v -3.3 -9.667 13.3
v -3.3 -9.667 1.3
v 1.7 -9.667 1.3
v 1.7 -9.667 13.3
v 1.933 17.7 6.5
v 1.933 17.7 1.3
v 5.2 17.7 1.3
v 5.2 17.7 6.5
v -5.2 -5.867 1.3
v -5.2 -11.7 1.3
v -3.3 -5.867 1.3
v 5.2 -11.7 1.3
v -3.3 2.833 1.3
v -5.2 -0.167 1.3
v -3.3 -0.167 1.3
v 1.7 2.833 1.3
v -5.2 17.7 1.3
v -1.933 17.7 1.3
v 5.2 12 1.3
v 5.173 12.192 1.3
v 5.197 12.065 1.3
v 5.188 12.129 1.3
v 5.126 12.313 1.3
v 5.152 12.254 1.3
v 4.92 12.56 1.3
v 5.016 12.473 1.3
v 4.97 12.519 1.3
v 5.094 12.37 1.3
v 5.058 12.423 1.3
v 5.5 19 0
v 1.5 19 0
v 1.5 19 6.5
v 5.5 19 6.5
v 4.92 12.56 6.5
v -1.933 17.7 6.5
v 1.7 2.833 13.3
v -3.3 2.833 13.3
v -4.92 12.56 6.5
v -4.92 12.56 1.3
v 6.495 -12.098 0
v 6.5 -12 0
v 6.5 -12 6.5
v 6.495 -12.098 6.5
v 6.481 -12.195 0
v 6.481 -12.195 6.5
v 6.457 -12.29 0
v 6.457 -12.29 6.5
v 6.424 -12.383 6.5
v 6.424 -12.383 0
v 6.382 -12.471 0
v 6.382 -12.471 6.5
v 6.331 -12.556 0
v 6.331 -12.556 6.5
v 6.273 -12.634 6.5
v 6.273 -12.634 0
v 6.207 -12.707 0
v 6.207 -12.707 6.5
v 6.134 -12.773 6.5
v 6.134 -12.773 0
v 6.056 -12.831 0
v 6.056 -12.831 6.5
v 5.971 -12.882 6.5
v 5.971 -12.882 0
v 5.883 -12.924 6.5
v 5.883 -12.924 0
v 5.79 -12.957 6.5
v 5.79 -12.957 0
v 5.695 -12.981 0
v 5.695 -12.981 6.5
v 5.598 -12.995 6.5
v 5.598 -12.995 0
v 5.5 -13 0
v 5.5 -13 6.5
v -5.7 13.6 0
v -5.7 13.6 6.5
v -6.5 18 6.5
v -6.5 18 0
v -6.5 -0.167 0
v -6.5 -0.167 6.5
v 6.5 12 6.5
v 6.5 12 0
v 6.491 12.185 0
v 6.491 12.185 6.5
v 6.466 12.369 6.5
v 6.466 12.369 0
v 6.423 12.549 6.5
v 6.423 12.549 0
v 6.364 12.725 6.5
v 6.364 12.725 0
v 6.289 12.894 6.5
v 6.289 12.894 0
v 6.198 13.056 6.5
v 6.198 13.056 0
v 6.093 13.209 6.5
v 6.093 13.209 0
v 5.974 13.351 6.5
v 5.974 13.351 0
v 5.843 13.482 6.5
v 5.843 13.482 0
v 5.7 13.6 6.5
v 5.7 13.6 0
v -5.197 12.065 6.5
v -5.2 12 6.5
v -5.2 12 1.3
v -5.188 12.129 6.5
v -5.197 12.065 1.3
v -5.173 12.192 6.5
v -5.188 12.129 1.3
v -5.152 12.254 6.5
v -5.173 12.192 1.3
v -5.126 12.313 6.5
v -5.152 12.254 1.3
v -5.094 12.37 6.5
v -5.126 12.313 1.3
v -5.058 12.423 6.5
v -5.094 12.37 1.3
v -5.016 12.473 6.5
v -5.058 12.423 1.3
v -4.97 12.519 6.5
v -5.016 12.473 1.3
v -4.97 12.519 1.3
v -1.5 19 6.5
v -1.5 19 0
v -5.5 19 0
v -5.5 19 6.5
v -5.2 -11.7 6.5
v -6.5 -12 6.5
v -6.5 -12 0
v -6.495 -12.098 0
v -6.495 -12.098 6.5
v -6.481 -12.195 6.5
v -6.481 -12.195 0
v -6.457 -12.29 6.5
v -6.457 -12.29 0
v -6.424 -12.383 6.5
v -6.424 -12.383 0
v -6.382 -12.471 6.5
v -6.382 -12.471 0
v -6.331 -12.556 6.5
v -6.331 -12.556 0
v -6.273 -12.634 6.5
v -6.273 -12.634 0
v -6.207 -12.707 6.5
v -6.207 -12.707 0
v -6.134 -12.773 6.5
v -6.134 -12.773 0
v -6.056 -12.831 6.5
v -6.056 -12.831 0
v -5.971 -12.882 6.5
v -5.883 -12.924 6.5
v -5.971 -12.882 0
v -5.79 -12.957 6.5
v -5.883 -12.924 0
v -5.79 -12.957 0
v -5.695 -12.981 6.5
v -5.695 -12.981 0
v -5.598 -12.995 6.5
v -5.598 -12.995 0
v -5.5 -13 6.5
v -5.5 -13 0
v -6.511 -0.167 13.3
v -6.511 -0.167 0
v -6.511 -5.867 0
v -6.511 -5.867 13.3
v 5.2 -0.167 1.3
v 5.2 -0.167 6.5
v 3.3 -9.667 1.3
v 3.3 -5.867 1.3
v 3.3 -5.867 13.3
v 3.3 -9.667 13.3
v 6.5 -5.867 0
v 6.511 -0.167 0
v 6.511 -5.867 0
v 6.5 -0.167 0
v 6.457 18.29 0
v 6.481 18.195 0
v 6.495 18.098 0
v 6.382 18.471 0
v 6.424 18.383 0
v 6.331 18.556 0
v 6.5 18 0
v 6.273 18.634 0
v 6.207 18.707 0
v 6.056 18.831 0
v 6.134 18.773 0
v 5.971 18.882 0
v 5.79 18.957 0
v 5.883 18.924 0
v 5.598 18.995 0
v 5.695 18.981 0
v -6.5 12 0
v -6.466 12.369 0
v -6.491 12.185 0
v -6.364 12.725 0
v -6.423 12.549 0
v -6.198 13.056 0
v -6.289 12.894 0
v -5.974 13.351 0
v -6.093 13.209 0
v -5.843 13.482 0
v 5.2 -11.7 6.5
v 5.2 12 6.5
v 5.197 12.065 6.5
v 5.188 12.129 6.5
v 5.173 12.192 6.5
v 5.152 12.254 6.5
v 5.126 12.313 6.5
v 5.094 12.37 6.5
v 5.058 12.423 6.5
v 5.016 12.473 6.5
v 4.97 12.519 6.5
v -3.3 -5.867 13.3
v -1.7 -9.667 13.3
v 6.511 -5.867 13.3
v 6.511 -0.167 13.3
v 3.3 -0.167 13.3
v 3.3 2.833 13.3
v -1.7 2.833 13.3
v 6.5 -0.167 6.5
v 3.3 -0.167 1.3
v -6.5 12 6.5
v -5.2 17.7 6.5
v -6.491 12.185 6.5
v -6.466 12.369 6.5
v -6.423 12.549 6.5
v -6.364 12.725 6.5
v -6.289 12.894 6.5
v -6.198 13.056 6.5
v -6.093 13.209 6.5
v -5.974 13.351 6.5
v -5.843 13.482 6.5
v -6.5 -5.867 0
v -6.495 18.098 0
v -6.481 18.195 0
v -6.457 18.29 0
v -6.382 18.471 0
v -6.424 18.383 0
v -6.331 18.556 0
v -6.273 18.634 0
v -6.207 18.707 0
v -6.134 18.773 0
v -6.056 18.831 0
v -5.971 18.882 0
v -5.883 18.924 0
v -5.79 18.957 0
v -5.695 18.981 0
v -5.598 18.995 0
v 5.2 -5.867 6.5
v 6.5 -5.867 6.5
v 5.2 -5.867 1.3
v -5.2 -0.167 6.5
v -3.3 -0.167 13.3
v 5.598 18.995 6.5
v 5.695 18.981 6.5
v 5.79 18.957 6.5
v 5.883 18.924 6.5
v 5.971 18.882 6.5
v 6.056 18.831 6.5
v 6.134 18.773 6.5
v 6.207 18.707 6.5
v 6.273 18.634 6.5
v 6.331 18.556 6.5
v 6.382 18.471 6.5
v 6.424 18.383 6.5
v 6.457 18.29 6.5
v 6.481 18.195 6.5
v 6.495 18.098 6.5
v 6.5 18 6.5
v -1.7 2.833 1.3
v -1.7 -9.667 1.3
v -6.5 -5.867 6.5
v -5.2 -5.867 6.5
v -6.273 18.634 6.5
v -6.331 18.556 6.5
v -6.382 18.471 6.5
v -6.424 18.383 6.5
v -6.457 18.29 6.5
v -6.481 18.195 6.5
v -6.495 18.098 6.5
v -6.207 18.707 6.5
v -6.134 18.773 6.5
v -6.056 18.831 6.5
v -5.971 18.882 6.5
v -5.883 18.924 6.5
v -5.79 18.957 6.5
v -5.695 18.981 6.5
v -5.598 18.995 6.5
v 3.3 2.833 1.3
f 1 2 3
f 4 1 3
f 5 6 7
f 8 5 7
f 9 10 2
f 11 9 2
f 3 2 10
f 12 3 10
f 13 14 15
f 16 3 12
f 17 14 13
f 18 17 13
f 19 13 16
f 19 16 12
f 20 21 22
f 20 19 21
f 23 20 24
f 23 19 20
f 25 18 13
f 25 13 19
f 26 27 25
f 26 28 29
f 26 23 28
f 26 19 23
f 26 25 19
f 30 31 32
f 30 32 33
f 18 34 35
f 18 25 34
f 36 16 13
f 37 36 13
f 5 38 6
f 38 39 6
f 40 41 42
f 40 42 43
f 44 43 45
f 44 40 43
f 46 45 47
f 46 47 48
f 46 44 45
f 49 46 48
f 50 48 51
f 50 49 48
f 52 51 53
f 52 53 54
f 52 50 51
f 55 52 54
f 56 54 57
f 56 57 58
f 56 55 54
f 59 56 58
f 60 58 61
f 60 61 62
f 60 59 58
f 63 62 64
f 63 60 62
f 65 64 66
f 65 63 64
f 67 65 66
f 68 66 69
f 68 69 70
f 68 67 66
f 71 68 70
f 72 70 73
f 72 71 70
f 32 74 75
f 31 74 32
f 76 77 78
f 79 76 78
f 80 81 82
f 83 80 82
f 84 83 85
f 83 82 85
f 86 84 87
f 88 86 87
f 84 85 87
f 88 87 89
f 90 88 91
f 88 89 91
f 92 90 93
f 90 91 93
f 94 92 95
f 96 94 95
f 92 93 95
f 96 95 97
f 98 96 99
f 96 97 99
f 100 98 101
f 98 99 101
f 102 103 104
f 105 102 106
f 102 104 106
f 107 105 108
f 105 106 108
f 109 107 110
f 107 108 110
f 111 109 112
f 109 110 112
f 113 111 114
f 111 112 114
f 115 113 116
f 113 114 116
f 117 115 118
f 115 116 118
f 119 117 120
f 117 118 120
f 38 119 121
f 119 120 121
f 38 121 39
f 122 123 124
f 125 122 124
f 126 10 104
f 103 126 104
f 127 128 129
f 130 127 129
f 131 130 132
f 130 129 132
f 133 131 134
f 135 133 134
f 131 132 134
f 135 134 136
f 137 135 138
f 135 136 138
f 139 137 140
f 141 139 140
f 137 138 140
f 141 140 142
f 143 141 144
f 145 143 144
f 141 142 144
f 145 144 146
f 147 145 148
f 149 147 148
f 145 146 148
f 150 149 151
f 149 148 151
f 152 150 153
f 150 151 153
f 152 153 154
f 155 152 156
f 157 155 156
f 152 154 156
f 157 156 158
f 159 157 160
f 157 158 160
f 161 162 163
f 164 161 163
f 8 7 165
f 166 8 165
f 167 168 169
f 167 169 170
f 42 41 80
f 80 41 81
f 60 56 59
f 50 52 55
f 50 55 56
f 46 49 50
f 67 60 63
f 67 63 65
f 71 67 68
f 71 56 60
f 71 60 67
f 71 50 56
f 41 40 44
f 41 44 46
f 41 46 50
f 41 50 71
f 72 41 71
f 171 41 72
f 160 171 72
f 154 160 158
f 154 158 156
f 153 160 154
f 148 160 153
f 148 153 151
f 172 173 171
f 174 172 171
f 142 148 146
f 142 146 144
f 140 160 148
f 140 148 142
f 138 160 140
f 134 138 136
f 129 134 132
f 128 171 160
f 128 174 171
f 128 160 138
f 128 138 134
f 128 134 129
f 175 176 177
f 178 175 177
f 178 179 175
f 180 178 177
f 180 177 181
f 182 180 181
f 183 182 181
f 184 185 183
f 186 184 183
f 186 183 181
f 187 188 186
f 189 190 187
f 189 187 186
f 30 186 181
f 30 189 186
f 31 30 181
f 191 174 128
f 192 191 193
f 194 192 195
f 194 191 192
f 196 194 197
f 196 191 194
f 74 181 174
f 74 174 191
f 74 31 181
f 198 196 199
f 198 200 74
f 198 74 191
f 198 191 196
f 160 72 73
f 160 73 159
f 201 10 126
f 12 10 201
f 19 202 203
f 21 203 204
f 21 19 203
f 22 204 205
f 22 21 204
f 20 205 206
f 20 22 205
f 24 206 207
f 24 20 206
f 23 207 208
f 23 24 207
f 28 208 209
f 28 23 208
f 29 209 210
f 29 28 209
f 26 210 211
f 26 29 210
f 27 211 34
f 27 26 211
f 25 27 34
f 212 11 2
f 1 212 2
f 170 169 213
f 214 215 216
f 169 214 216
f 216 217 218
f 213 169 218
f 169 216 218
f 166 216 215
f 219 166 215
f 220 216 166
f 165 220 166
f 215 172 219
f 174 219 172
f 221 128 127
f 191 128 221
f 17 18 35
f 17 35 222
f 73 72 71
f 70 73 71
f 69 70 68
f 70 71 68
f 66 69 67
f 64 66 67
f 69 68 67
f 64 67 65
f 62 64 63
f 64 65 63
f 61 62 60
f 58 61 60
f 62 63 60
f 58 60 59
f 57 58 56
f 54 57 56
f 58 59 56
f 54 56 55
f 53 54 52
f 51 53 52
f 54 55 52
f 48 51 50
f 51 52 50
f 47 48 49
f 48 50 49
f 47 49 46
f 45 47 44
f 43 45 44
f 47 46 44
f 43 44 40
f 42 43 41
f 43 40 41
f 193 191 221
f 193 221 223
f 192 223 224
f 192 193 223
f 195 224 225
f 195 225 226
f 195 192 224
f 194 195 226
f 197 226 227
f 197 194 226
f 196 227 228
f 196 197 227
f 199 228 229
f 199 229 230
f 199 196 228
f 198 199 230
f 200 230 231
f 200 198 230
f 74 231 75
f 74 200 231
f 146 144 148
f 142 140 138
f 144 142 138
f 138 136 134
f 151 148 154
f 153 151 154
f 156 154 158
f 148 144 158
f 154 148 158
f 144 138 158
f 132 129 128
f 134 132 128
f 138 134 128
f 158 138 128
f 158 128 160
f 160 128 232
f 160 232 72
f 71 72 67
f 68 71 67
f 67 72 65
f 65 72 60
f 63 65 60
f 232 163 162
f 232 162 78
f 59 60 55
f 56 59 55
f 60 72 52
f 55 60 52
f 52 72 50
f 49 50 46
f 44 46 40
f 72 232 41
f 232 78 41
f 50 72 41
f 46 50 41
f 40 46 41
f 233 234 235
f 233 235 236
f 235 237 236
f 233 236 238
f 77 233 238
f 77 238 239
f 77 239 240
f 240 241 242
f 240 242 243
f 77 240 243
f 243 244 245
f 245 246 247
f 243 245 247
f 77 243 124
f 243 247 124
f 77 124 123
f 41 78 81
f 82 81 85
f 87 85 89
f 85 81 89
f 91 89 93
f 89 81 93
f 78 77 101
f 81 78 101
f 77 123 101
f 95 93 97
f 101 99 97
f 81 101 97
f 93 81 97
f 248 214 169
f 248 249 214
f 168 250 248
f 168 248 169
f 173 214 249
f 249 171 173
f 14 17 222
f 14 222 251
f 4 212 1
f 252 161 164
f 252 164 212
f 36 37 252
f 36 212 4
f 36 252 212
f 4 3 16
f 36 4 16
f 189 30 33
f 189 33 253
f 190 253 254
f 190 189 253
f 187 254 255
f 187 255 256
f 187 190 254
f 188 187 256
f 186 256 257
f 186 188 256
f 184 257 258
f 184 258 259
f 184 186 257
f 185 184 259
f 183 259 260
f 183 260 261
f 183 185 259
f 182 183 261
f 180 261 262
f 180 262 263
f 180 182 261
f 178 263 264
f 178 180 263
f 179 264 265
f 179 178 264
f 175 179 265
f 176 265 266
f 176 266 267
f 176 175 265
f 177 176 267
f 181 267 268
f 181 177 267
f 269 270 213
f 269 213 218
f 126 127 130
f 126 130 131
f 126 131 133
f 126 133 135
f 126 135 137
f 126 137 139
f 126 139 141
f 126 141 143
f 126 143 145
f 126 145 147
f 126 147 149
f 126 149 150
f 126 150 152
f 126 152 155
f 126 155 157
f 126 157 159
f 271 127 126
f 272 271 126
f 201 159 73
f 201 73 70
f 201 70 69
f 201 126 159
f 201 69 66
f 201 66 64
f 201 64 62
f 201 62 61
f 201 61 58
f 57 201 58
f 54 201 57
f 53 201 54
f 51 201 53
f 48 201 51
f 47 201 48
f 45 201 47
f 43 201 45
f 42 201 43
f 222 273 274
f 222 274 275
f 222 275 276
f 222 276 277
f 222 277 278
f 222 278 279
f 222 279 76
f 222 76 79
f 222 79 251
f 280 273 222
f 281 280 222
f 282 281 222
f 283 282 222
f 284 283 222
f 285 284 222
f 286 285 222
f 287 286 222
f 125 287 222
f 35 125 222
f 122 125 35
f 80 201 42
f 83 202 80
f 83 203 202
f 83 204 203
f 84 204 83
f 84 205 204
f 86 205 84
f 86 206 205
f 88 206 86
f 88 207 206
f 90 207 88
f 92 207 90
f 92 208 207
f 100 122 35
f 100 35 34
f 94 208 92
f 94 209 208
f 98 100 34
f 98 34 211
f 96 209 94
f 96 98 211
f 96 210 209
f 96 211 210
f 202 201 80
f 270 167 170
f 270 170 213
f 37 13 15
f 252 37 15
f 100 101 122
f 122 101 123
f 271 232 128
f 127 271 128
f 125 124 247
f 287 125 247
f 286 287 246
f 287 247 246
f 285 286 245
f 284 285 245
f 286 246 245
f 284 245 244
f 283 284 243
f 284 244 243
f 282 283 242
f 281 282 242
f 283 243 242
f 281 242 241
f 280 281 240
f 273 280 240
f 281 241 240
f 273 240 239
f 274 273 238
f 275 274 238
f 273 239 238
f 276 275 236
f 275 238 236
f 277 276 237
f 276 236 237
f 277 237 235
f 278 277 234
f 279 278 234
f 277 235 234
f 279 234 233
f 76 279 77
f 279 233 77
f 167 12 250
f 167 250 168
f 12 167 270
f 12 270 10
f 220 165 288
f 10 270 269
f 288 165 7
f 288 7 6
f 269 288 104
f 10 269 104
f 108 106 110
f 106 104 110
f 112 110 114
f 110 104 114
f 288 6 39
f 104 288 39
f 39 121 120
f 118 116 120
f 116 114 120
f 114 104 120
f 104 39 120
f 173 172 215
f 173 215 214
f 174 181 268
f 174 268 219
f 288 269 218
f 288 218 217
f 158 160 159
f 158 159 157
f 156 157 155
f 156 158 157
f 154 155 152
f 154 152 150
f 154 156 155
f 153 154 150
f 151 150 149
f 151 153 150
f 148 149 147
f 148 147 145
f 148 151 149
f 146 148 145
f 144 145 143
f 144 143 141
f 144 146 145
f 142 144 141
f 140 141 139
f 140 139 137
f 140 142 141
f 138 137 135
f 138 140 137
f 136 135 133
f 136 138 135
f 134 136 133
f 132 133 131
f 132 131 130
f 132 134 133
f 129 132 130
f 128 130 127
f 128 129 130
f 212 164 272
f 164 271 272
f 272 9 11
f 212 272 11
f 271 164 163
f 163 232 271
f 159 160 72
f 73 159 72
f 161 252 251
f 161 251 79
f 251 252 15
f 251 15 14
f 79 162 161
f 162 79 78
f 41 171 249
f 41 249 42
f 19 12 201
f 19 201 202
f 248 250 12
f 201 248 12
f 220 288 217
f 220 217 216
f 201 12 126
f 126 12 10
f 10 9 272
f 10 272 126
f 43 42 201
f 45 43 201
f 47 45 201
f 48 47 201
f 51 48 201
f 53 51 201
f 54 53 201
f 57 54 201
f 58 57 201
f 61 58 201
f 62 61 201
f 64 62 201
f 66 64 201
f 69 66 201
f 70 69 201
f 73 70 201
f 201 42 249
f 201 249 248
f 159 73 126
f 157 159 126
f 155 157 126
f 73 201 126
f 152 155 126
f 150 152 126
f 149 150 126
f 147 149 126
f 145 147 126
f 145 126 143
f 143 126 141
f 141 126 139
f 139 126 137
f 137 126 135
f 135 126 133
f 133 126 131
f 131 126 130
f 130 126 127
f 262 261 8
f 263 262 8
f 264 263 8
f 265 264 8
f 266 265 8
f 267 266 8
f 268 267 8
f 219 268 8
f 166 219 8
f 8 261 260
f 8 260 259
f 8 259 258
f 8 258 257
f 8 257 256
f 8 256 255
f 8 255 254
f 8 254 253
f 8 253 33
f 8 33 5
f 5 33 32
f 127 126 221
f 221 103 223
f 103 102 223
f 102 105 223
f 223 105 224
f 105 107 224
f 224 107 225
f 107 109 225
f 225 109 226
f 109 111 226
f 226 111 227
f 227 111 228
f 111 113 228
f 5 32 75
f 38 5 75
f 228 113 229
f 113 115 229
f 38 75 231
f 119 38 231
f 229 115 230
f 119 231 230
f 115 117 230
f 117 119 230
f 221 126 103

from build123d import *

# Parameters (mm, degrees)
F1_DEPTH = 6.5
F2_T     = -1.3
F4_DEPTH = 13.3


# Not quite as in the source:
# - a feature names something its author has since deleted; it is built from what else it names


with BuildPart() as f1:
    # F0 (on Top) → F1 (new body)
    with BuildSketch(Plane.XY):
        with BuildLine():
            Line((-5.5, -13), (5.5, -13))
            ThreePointArc((5.5, -13), (6.2071067812, -12.7071067812), (6.5, -12))
            Line((6.5, -12), (6.5, 12))
            ThreePointArc((6.5, 12), (6.288854382, 12.894427191), (5.7, 13.6))
            Line((5.7, 13.6), (-1.5, 19))
            Line((-1.5, 19), (-5.5, 19))
            ThreePointArc((-5.5, 19), (-6.2071067812, 18.7071067812), (-6.5, 18))
            Line((-6.5, 18), (-6.5, 13))
            Line((-6.5, 13), (-6.5, -12))
            ThreePointArc((-6.5, -12), (-6.2071067812, -12.7071067812), (-5.5, -13))
        make_face()
    extrude(amount=F1_DEPTH)

    # F2
    f2_openings = [f1.faces().sort_by_distance(p)[0] for p in [
        (-0.234078, 2.146096, 6.5),
    ]]
    offset(amount=F2_T, openings=f2_openings)

    # F3 (on Top) → F4 (join)
    with BuildSketch(Plane.XY):
        Polygon((-3.3, -9.6670114048), (1.7, -9.6670114048), (1.7, 2.8329885952), (-3.3, 2.8329885952), (-3.3, -0.1670114048), (-6.5110628493, -0.1670114048), (-6.5110628493, -5.8670114048), (-3.3, -5.8670114048), align=None)
    extrude(amount=F4_DEPTH)


with BuildPart() as f6_1:
    # F6: instance of F1
    add(f1.part.mirror(Plane.YZ))


solid = Compound([f1.part, f6_1.part])
